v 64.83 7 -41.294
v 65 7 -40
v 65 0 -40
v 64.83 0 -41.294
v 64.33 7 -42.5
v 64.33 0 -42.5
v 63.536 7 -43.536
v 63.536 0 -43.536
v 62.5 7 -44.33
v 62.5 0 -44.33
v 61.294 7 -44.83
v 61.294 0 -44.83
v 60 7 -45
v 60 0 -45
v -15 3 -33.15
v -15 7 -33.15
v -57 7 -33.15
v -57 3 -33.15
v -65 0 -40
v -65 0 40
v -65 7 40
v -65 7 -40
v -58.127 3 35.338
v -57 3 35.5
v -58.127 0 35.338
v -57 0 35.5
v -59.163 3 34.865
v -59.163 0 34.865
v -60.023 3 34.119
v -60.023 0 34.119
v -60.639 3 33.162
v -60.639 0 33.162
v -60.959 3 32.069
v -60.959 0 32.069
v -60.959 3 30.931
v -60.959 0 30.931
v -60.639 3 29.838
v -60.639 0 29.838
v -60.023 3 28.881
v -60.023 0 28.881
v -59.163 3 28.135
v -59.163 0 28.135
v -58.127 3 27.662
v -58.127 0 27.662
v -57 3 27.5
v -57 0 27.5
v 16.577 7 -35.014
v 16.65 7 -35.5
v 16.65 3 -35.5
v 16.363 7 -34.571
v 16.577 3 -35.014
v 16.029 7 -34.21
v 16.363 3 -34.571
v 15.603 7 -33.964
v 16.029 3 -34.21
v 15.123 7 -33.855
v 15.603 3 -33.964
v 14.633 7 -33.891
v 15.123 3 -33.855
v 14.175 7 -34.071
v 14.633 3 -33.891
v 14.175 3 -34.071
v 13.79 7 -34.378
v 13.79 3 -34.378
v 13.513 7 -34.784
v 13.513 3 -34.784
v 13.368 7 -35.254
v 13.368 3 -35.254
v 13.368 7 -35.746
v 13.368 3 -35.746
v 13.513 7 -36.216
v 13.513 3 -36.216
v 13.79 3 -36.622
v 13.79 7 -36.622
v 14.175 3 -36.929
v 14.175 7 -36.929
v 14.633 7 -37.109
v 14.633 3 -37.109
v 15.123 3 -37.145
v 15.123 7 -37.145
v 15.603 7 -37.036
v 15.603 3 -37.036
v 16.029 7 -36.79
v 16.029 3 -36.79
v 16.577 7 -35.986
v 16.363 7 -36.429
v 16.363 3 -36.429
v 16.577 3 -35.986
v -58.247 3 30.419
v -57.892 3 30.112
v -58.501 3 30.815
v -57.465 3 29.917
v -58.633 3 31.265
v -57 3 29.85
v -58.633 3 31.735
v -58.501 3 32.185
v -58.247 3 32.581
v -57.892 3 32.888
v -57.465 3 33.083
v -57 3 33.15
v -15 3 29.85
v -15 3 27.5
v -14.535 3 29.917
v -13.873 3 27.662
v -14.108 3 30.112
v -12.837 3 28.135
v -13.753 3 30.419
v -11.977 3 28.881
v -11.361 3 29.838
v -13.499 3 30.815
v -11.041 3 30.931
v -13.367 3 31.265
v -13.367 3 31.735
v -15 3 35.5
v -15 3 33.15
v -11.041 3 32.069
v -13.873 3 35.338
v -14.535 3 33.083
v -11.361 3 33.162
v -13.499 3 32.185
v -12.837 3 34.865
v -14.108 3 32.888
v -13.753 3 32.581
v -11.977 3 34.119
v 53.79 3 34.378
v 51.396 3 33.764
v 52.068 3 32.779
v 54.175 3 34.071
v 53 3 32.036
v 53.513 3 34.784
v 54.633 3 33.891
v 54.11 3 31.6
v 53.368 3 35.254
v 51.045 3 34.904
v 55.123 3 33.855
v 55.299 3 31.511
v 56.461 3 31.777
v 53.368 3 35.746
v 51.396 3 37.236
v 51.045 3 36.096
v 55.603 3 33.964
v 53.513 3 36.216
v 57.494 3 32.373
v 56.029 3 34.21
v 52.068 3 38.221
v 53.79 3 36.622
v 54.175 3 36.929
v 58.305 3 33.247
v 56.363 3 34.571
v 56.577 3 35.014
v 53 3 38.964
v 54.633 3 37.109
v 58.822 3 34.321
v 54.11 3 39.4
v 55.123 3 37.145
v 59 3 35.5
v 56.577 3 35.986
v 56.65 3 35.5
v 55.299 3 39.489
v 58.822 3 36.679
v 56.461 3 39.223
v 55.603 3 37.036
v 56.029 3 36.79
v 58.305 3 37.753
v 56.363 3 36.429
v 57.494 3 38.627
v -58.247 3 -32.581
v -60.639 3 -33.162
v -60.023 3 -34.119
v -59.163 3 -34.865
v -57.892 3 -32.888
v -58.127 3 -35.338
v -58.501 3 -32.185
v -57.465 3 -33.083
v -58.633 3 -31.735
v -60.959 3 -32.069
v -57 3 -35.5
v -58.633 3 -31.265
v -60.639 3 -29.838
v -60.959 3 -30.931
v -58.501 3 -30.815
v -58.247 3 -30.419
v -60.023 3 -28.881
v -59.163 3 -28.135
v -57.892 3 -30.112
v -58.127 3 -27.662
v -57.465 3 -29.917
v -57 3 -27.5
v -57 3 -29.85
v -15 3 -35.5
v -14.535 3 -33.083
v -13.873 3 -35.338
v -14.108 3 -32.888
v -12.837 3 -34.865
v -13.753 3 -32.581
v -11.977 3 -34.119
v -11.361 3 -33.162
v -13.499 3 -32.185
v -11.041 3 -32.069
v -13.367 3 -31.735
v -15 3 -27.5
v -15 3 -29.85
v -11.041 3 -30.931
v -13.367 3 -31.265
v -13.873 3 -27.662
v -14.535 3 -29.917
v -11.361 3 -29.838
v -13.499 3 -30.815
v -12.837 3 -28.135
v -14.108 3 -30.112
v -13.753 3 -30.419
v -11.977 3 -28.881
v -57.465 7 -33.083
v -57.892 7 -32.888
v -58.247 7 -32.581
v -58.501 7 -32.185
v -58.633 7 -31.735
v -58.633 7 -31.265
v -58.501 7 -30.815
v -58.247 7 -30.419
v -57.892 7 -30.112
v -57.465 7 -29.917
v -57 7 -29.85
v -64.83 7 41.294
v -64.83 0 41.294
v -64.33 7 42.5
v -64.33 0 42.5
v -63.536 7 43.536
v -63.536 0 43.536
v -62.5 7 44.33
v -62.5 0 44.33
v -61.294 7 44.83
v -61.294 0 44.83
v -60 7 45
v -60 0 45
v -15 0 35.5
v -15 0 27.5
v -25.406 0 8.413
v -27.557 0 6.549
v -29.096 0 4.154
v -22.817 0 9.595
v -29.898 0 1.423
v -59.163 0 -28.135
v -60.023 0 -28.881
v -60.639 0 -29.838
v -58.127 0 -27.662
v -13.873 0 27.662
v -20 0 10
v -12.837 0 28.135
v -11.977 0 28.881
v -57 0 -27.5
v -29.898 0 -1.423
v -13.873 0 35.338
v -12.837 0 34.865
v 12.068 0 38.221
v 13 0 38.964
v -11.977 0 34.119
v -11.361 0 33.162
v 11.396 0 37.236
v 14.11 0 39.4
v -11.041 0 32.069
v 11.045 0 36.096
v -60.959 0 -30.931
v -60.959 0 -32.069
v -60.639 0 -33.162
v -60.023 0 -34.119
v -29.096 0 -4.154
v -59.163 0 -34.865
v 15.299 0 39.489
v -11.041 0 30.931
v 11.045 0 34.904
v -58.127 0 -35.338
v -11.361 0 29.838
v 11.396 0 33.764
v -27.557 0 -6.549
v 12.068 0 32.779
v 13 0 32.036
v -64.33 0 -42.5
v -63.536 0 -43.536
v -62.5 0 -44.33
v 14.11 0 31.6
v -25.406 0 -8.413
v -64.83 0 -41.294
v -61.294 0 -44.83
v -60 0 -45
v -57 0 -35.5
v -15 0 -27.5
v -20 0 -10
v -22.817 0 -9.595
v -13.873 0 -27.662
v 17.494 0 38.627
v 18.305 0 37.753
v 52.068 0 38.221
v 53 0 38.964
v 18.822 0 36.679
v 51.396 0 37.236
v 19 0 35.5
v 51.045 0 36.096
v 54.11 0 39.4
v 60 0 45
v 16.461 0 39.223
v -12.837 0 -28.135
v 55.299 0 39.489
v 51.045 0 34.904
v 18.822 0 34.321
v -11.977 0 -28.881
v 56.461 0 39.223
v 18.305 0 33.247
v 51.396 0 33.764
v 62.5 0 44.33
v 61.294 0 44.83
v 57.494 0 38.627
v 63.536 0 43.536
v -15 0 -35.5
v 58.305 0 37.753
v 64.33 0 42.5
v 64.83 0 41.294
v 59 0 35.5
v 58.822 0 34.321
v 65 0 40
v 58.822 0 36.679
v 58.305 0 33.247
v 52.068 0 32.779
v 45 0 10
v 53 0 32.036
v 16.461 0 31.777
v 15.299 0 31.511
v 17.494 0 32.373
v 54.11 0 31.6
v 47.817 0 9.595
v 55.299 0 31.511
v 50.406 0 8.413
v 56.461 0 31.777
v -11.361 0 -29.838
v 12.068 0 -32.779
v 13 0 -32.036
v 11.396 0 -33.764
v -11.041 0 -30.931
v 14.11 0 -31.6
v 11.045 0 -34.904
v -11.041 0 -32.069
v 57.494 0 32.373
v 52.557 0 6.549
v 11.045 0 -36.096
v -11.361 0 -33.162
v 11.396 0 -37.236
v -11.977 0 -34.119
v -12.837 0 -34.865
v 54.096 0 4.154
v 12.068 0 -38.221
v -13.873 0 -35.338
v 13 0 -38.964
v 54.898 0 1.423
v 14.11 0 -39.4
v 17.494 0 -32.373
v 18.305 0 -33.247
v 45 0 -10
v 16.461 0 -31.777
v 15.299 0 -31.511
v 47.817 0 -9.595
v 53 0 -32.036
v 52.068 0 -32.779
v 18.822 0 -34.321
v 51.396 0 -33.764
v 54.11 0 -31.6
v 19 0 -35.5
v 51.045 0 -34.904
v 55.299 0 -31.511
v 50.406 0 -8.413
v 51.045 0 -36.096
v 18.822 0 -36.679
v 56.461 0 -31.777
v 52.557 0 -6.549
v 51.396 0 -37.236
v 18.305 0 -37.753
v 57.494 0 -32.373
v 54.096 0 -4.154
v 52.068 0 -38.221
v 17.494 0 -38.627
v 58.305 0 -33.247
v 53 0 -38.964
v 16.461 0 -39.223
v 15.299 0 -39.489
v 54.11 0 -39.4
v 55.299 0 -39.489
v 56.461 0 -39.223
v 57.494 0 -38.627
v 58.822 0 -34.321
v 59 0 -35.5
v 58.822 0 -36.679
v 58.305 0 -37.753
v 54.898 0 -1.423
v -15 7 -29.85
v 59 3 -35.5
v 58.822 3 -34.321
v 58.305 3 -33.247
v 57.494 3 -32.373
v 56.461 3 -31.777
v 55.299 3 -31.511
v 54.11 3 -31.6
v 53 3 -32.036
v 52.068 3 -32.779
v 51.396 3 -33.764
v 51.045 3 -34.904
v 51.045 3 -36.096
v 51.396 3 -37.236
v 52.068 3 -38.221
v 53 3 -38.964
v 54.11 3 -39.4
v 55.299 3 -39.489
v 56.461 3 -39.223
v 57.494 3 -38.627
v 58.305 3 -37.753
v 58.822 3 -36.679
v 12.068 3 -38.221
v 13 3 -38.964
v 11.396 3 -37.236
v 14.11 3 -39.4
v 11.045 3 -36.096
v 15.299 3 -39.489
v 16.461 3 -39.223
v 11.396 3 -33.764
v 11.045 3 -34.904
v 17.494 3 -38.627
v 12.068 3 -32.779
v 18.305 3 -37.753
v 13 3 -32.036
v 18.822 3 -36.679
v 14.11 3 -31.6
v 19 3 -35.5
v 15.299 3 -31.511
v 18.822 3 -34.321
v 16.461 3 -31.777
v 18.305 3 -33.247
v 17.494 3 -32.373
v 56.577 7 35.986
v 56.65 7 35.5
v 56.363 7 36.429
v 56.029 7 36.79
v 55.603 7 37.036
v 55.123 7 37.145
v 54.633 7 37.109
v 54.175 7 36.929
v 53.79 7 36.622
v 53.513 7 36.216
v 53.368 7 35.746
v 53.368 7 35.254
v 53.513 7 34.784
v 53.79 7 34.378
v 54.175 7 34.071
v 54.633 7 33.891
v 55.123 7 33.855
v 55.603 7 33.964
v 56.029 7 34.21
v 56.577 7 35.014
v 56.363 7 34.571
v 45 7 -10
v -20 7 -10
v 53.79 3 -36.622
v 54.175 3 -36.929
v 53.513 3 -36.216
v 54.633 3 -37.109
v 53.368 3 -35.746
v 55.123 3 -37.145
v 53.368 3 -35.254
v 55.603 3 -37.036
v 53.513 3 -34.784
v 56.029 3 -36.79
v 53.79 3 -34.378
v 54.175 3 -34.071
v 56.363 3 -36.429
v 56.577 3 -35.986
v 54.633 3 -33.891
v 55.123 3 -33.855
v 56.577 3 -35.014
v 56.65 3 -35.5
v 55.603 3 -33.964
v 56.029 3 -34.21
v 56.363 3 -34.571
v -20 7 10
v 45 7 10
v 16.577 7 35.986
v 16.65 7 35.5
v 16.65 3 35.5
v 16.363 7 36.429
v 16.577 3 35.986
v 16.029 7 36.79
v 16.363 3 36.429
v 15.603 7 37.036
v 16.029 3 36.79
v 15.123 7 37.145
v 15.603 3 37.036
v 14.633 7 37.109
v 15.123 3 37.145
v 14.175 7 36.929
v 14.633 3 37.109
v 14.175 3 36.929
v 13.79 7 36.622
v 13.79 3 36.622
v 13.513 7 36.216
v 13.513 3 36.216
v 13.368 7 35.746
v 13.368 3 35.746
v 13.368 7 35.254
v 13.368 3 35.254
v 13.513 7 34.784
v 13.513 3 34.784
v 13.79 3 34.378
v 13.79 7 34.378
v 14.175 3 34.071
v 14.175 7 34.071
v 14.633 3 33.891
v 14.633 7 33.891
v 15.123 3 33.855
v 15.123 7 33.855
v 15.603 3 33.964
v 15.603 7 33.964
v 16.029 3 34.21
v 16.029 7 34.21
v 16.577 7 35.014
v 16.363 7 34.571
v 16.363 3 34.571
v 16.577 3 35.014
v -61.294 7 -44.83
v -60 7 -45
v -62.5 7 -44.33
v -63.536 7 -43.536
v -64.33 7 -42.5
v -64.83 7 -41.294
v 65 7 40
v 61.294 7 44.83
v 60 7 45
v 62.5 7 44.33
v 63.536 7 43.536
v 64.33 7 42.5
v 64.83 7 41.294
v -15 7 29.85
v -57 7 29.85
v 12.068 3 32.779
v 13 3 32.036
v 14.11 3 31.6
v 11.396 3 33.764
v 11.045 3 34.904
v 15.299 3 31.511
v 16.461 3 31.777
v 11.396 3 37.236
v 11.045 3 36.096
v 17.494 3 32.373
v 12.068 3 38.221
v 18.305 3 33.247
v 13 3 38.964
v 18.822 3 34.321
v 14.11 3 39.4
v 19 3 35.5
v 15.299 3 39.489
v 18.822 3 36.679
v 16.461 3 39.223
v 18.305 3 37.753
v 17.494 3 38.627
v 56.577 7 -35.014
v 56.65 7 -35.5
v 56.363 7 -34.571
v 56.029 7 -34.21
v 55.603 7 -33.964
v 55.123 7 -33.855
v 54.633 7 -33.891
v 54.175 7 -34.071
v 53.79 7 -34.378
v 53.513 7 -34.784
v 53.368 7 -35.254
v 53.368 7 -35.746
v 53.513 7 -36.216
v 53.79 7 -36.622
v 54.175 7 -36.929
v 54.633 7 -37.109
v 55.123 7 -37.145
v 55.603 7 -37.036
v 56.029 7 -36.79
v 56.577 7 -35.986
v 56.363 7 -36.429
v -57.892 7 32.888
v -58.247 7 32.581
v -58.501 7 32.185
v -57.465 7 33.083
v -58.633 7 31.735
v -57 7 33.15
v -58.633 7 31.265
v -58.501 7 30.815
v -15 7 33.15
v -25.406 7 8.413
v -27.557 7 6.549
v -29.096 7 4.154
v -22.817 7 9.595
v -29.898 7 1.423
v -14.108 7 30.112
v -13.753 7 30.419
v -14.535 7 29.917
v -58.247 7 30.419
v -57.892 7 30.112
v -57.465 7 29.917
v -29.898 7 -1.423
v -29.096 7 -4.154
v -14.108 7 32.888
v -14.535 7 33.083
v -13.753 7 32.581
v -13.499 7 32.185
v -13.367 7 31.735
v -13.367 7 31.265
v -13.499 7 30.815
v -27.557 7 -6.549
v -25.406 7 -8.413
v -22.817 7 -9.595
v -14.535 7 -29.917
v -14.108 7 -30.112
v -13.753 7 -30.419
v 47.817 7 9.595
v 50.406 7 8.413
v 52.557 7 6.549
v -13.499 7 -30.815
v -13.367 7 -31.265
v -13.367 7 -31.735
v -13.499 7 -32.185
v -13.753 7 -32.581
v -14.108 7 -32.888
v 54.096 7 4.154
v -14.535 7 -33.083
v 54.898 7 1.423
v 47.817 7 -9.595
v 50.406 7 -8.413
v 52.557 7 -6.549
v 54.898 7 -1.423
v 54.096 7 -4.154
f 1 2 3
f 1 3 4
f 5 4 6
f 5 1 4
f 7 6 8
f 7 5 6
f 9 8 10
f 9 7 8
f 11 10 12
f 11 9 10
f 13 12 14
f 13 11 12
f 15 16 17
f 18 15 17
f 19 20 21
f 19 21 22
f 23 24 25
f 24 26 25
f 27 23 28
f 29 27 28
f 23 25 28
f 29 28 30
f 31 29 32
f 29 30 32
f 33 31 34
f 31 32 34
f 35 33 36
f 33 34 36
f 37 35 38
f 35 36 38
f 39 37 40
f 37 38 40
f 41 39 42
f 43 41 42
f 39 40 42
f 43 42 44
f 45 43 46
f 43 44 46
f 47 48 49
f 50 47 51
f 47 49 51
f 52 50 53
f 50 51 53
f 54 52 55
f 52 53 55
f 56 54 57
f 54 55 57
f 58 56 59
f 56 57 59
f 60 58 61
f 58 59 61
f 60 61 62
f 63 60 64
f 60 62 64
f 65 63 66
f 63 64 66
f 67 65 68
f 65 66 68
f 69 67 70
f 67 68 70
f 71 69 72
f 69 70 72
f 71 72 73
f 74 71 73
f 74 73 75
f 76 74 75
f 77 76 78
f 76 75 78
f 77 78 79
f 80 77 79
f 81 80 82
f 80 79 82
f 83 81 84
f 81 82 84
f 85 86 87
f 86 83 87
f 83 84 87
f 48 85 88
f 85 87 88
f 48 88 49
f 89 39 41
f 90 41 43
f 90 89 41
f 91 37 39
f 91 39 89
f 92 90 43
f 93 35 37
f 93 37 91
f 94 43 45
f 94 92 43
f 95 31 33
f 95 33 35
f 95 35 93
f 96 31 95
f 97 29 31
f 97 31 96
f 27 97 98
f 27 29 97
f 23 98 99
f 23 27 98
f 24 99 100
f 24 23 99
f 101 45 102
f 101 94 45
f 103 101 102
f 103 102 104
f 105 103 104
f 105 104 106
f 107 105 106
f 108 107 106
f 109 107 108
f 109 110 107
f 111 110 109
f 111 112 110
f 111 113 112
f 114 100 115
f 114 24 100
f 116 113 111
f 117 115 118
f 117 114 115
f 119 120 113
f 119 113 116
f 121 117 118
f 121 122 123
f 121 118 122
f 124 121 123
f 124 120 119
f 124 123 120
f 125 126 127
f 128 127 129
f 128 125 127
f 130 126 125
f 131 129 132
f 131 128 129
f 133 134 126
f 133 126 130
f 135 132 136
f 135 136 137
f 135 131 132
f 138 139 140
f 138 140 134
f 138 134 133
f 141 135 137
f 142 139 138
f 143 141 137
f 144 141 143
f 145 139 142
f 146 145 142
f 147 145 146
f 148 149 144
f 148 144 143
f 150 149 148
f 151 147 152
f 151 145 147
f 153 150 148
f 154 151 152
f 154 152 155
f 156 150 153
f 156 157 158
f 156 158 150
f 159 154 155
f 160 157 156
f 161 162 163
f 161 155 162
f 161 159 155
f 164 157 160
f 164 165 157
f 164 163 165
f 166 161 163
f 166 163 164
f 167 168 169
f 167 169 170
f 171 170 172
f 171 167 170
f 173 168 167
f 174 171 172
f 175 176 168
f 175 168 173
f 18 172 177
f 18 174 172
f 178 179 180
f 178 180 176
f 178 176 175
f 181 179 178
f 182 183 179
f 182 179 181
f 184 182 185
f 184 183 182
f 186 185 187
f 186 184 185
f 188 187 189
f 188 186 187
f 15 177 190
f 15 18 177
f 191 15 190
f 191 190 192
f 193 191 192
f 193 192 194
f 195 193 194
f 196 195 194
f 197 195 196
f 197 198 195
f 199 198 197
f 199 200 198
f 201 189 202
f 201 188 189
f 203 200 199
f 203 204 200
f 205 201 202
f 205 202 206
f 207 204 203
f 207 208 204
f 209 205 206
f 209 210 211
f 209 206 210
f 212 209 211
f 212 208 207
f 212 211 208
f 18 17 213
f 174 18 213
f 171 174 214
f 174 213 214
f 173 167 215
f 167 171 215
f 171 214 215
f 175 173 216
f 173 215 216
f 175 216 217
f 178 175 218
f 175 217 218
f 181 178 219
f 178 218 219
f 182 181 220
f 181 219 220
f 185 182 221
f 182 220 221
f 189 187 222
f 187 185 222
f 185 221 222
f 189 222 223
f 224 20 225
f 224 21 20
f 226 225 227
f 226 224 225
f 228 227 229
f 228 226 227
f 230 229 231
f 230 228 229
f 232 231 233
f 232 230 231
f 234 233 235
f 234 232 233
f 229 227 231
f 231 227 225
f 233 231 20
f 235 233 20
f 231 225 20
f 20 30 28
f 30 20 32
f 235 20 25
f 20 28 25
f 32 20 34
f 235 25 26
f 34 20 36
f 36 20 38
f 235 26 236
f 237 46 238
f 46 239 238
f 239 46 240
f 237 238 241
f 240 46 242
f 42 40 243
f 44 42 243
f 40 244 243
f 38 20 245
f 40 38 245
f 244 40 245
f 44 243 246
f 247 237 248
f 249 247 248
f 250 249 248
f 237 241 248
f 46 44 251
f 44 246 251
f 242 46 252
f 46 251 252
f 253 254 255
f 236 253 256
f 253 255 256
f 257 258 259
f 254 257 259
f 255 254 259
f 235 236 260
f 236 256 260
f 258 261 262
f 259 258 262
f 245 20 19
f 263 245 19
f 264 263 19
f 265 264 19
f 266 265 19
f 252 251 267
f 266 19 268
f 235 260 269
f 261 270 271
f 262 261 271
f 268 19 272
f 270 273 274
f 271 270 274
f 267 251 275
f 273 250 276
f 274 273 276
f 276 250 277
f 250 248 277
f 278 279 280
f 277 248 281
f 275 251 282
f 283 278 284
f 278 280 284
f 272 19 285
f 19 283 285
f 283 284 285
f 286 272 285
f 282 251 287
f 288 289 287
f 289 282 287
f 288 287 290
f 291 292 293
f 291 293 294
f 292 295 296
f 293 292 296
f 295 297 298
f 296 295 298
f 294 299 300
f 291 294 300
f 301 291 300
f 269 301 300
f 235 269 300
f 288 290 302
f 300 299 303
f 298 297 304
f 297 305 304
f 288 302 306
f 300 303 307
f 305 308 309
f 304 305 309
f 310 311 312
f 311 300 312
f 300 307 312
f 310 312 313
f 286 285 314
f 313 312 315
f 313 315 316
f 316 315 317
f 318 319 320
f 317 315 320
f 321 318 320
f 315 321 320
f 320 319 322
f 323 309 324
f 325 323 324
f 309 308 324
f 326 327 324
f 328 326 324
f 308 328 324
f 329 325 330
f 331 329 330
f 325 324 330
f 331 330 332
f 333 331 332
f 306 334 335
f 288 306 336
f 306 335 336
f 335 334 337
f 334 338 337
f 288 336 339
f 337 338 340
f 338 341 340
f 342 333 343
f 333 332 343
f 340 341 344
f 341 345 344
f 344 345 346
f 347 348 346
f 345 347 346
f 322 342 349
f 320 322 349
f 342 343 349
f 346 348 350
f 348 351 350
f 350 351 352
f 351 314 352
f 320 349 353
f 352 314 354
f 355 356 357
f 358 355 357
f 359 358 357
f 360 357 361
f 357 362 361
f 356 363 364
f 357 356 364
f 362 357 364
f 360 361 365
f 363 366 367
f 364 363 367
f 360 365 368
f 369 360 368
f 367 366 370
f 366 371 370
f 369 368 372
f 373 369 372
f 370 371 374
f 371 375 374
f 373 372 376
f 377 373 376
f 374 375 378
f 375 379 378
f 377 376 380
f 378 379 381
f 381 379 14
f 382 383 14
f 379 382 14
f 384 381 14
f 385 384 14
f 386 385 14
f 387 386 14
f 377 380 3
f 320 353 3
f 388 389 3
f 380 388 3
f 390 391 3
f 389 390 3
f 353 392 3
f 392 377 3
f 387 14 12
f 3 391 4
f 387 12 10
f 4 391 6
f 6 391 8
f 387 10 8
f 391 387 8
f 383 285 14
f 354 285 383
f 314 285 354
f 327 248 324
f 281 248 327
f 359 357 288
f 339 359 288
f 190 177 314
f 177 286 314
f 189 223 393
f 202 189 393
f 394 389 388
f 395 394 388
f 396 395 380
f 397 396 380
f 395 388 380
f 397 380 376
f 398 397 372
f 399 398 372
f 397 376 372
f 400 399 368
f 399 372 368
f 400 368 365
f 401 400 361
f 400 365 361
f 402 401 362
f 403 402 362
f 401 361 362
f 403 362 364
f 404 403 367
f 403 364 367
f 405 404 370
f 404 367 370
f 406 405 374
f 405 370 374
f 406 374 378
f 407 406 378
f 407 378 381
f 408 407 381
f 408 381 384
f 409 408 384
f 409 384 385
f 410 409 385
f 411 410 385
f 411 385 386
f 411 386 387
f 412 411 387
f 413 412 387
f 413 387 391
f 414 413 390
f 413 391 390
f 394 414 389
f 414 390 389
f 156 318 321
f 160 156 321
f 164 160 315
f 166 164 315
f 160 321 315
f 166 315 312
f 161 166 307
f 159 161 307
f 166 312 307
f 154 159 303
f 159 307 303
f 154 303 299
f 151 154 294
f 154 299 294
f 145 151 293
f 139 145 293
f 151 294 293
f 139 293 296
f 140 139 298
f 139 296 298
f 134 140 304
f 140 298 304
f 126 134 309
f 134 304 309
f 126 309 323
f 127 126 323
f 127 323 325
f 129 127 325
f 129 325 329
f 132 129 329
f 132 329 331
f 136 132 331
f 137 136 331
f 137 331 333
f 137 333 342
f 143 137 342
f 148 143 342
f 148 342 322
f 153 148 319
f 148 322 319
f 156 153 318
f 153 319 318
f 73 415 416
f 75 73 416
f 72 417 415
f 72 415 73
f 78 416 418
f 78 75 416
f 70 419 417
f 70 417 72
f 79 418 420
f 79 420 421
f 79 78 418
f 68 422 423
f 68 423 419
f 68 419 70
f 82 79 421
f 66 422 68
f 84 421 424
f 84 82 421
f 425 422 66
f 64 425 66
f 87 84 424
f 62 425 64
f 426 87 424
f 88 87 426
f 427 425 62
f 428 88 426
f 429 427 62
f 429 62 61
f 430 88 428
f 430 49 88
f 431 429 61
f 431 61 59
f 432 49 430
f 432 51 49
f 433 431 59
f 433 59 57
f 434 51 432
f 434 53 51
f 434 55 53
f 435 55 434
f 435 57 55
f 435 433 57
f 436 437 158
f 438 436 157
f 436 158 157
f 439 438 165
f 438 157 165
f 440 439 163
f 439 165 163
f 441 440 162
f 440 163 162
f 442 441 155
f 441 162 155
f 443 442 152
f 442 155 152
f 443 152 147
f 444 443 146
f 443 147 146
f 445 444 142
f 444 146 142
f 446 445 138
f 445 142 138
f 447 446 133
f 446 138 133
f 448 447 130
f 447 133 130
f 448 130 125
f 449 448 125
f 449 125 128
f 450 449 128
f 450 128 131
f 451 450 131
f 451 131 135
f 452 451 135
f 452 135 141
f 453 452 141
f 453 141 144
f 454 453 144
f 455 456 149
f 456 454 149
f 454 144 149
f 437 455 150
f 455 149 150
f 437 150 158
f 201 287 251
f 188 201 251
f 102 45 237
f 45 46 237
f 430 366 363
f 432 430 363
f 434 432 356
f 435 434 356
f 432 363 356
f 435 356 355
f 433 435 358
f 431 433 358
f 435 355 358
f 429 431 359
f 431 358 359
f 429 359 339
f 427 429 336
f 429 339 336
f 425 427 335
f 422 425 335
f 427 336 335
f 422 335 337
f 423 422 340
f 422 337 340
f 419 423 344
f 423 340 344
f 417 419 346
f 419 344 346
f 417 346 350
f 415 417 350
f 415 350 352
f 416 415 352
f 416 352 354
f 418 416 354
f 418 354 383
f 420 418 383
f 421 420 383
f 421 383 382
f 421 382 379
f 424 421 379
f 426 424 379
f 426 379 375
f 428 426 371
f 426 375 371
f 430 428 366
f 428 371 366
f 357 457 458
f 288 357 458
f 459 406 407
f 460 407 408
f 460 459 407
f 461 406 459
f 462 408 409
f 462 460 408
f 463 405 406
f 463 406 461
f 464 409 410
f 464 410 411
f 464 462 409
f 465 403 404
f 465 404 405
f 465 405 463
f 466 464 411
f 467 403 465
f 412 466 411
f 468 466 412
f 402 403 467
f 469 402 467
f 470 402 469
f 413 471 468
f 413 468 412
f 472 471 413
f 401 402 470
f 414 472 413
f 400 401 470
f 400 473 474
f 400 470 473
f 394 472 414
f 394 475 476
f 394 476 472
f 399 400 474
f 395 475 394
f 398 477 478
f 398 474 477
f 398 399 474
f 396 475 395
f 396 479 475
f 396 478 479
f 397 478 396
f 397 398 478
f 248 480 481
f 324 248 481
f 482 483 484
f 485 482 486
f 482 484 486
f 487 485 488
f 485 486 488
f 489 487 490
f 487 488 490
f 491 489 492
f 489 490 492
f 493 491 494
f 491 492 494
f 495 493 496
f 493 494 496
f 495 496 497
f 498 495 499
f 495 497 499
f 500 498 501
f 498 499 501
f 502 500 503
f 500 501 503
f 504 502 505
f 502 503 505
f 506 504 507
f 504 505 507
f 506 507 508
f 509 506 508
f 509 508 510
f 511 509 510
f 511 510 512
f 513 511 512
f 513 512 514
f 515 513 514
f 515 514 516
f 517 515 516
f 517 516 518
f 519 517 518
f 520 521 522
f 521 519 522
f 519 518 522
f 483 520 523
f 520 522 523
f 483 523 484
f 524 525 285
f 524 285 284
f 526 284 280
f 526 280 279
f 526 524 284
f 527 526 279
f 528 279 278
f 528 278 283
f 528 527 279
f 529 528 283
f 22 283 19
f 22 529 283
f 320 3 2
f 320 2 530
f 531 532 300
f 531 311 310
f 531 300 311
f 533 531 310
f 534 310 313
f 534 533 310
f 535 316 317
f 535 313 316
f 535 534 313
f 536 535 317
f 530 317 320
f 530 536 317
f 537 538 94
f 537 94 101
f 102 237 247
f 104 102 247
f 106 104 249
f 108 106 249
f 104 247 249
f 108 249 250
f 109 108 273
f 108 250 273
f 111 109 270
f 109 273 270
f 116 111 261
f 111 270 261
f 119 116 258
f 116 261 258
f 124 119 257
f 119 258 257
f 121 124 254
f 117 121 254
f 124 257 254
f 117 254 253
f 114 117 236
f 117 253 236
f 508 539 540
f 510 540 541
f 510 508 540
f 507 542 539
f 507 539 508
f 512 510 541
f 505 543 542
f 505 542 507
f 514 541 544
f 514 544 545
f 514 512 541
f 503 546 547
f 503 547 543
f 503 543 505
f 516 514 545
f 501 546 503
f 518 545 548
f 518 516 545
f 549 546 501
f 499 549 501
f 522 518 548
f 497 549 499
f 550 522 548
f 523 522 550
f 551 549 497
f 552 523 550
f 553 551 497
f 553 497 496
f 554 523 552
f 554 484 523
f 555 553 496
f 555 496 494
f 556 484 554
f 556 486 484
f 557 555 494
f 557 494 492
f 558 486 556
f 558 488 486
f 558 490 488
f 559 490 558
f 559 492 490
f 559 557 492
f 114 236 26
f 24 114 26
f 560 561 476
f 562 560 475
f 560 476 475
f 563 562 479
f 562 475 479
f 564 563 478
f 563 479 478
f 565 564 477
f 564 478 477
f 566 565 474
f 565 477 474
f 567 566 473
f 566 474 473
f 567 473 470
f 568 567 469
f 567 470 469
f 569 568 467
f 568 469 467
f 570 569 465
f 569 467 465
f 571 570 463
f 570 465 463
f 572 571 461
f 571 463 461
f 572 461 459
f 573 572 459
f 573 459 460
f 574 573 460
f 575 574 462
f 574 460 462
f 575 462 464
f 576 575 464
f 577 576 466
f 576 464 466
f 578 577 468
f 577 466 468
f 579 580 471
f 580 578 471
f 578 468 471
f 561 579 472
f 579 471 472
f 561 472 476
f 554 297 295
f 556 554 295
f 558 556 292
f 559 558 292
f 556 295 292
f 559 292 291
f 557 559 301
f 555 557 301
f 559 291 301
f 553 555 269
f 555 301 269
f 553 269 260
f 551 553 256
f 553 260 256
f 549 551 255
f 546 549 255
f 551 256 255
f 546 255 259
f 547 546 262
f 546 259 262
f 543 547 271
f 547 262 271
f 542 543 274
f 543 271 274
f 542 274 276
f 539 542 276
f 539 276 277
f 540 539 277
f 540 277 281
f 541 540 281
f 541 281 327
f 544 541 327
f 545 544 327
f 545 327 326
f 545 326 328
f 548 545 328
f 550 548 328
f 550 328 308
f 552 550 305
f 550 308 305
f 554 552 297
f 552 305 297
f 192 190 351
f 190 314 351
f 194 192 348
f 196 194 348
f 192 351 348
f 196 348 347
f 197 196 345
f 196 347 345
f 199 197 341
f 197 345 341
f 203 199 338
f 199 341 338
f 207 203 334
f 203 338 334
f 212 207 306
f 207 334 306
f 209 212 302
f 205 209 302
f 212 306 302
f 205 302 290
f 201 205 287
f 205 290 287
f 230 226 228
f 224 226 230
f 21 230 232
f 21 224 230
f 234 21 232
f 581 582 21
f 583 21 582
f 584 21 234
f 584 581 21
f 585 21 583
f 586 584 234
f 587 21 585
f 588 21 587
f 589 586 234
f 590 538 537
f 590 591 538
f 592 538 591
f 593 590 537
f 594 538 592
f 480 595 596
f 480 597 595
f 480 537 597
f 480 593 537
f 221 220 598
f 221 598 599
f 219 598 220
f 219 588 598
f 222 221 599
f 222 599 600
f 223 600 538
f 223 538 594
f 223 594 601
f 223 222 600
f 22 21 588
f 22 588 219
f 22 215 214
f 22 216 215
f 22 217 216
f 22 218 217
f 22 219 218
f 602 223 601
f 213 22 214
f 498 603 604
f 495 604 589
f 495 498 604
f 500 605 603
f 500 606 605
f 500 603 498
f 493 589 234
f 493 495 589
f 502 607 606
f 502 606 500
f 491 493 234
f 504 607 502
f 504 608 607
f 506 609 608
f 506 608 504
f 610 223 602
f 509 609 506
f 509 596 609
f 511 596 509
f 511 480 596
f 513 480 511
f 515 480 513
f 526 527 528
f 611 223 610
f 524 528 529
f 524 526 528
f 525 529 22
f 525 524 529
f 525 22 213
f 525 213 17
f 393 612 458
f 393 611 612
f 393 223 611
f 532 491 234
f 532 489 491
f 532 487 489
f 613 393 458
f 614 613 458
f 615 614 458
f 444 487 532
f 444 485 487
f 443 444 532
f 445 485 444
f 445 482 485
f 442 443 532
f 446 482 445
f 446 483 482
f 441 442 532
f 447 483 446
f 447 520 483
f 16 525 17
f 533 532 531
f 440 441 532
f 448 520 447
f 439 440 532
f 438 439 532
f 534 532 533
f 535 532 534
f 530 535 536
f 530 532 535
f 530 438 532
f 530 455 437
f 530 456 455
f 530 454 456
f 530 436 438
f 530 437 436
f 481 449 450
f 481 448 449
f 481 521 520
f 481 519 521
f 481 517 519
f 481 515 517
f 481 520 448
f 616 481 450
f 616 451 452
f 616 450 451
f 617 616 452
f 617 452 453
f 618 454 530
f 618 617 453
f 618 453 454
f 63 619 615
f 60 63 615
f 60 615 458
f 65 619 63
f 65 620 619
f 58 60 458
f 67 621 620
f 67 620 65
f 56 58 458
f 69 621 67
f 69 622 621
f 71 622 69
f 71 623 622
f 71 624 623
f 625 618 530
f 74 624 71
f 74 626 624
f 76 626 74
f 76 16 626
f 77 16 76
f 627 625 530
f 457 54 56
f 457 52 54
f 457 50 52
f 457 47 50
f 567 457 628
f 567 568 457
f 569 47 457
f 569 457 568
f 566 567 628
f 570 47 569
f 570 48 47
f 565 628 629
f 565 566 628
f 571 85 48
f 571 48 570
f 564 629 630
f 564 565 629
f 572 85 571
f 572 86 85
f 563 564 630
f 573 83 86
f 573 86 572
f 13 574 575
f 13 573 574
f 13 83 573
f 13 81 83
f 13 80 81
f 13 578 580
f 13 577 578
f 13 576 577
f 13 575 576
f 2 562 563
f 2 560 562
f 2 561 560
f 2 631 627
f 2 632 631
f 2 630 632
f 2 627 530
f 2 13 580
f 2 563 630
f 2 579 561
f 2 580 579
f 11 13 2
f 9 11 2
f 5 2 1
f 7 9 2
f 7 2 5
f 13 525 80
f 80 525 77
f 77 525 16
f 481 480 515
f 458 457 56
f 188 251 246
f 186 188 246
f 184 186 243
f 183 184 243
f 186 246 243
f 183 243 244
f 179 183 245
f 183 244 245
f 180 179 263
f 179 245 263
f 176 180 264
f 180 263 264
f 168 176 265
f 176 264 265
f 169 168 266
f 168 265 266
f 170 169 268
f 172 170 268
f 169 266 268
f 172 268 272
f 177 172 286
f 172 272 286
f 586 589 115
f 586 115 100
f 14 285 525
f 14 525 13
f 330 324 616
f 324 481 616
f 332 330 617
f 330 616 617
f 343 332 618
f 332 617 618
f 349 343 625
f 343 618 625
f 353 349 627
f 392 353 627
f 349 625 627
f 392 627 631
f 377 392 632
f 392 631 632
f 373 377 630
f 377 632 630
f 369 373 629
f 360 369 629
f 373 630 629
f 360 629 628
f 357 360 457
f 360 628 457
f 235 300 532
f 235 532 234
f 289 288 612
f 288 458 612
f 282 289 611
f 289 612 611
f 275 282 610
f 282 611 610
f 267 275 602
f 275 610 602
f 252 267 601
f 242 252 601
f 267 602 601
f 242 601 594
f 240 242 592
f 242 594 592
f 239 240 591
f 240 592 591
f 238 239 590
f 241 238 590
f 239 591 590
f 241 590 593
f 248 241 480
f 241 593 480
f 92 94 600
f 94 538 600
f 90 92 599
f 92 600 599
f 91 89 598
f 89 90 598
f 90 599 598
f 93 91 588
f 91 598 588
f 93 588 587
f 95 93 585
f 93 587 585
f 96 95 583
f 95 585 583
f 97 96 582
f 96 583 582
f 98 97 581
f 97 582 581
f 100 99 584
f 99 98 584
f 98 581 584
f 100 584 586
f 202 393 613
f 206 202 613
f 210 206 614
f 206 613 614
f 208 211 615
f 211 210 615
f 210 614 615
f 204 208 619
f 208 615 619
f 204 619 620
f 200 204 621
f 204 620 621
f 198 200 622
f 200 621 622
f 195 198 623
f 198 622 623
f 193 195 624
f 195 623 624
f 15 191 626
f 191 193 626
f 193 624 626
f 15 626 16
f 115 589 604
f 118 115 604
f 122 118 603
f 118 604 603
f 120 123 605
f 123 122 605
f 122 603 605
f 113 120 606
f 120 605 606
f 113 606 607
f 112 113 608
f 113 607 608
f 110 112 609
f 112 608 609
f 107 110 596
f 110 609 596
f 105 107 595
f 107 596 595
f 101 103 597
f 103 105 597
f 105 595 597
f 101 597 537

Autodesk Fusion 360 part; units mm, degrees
sketch "Sketch1" plane through (0, 0, 0) normal (0, 1, 0) x (1, 0, 0)
  line L0 (-65, 45) -> (65, 45)
  line L1 (65, 45) -> (65, -45)
  line L2 (65, -45) -> (-65, -45)
  line L3 (-65, -45) -> (-65, 45)
  circle A0 centre (55, 35.5) radius 1.65
  circle A1 centre (15, 35.5) radius 1.65
  circle A2 centre (55, -35.5) radius 1.65
  circle A3 centre (15, -35.5) radius 1.65
  dimension "d4" = 65
  dimension "d5" = 45
  dimension "d8" = 90
  dimension "d9" = 130
  dimension "d10" = 3.3
  dimension "d12" = 10
  dimension "d13" = 9.5
  dimension "d16" = -40
  dimension "d17" = -71
extrude "Extrude1" add sketch "Sketch1" along normal blind 7
sketch "Sketch2" plane through (0, 7, 0) normal (0, 1, 0) x (-1, 0, 0)
  circle A0 centre (-55, 35.5) radius 1.65
  circle A1 centre (-15, 35.5) radius 1.65
  circle A2 centre (-15, -35.5) radius 1.65
  circle A3 centre (-55, -35.5) radius 1.65
  line L0 (65, 45) -> (-65, 45)
  line L1 (-65, 45) -> (-65, -45)
  line L2 (-65, -45) -> (65, -45)
  line L3 (65, -45) -> (65, 45)
  line L4 (-45, -10) -> (20, -10)
  arc A4 (20, -10) -> (20, 10) centre (20, 0) ccw
  line L5 (20, 10) -> (-45, 10)
  arc A5 (-45, 10) -> (-45, -10) centre (-45, 0) ccw
  line L6 (-45, 0) -> (20, 0) construction
  dimension "d18" = 65
  dimension "d19" = 20
  dimension "d20" = 10
  dimension "d22" = 45
extrude "Extrude2" cut sketch "Sketch2" against normal up to surface (7 mm away) contours L4 A4 L5 A5
fillet "Fillet1" radius 5 4 edges at (65, 3.5, 45) (-65, 3.5, 45) (-65, 3.5, -45) (65, 3.5, -45)
sketch "Sketch3" plane through (0, 7, 0) normal (0, 1, 0) x (-1, 0, 0)
  arc A0 (-65, -40) -> (-60, -45) centre (-60, -40) ccw
  line L0 (-60, -45) -> (60, -45)
  arc A1 (60, -45) -> (65, -40) centre (60, -40) ccw
  line L1 (65, -40) -> (65, 40)
  arc A2 (65, 40) -> (60, 45) centre (60, 40) ccw
  line L2 (60, 45) -> (-60, 45)
  arc A3 (-60, 45) -> (-65, 40) centre (-60, 40) ccw
  line L3 (-65, 40) -> (-65, -40)
  line L4 (-45, 10) -> (20, 10)
  arc A4 (20, -10) -> (20, 10) centre (20, 0) ccw
  line L5 (20, -10) -> (-45, -10)
  arc A5 (-45, 10) -> (-45, -10) centre (-45, 0) ccw
  circle A6 centre (-55, 35.5) radius 1.65
  circle A7 centre (-15, 35.5) radius 1.65
  circle A8 centre (-15, -35.5) radius 1.65
  circle A9 centre (-55, -35.5) radius 1.65
  line L6 (57, -29.85) -> (15, -29.85)
  arc A10 (15, -29.85) -> (15, -33.15) centre (15, -31.5) ccw
  line L7 (15, -33.15) -> (57, -33.15)
  arc A11 (57, -33.15) -> (57, -29.85) centre (57, -31.5) ccw
  line L8 (57, -31.5) -> (15, -31.5) construction
  line L9 (0, 0) -> (102, 0) construction
  arc A12 (15, 33.15) -> (15, 29.85) centre (15, 31.5) ccw
  line L10 (15, 33.15) -> (57, 33.15)
  line L11 (57, 29.85) -> (15, 29.85)
  arc A13 (57, 29.85) -> (57, 33.15) centre (57, 31.5) ccw
  dimension "d26" = 3.3
  dimension "d27" = 8
  dimension "d28" = 42
  dimension "d30" = 31.5
extrude "Extrude3" cut sketch "Sketch3" against normal up to surface (7 mm away) contours L6 A10 L7 A11 | A12 L10 L11 A13
sketch "Sketch4" plane through (0, 0, 0) normal (0, -1, 0) x (1, 0, 0)
  line L0 (-15, -33.15) -> (-57, -33.15)
  arc A0 (-57, -29.85) -> (-57, -33.15) centre (-57, -31.5) ccw
  line L1 (-57, -29.85) -> (-15, -29.85)
  arc A1 (-15, -33.15) -> (-15, -29.85) centre (-15, -31.5) ccw
  line L2 (-57, 33.15) -> (-15, 33.15)
  arc A2 (-15, 29.85) -> (-15, 33.15) centre (-15, 31.5) ccw
  line L3 (-15, 29.85) -> (-57, 29.85)
  arc A3 (-57, 33.15) -> (-57, 29.85) centre (-57, 31.5) ccw
  line L4 (-20, 10) -> (45, 10)
  arc A4 (45, -10) -> (45, 10) centre (45, 0) ccw
  line L5 (45, -10) -> (-20, -10)
  arc A5 (-20, 10) -> (-20, -10) centre (-20, 0) ccw
  circle A6 centre (55, 35.5) radius 1.65
  circle A7 centre (15, 35.5) radius 1.65
  circle A8 centre (15, -35.5) radius 1.65
  circle A9 centre (55, -35.5) radius 1.65
  arc A10 (60, -45) -> (65, -40) centre (60, -40) ccw
  line L6 (65, -40) -> (65, 40)
  arc A11 (65, 40) -> (60, 45) centre (60, 40) ccw
  line L7 (60, 45) -> (-60, 45)
  arc A12 (-60, 45) -> (-65, 40) centre (-60, 40) ccw
  line L8 (-65, 40) -> (-65, -40)
  arc A13 (-65, -40) -> (-60, -45) centre (-60, -40) ccw
  line L9 (-60, -45) -> (60, -45)
  circle A14 centre (55, 35.5) radius 4
  circle A15 centre (55, -35.5) radius 4
  circle A16 centre (15, 35.5) radius 4
  circle A17 centre (15, -35.5) radius 4
  line L10 (-57, 27.5) -> (-15, 27.5)
  arc A18 (-15, 27.5) -> (-15, 35.5) centre (-15, 31.5) ccw
  line L11 (-15, 35.5) -> (-57, 35.5)
  arc A19 (-57, 35.5) -> (-57, 27.5) centre (-57, 31.5) ccw
  line L12 (-57, 31.5) -> (-15, 31.5) construction
  line L13 (-57, -35.5) -> (-15, -35.5)
  arc A20 (-15, -35.5) -> (-15, -27.5) centre (-15, -31.5) ccw
  line L14 (-15, -27.5) -> (-57, -27.5)
  arc A21 (-57, -27.5) -> (-57, -35.5) centre (-57, -31.5) ccw
  line L15 (-57, -31.5) -> (-15, -31.5) construction
  dimension "d33" = 8
  dimension "d34" = 8
  dimension "d35" = 8
  dimension "d36" = 8
  dimension "d37" = 8
  dimension "d38" = 8
extrude "Extrude4" cut sketch "Sketch4" against normal blind 3 contours A14 | A15 | A16 | A17 | L10 A18 L11 A19 | L13 A20 L14 A21
equation "length = 130 mm"
equation "width = 90 mm"
equation "thickness = 7 mm"
equation "d4 = length / 2"
equation "d5 = width / 2"
equation "d6 = thickness"
equation "d8 = width"
equation "d9 = length"
equation "d10 = d11"
equation "d11 = 3.3 mm"
equation "d13 = ( width - 71 mm ) / 2"
equation "d22 = width / 2"
equation "d30 = ( 63 / 2 ) * 1 mm"
